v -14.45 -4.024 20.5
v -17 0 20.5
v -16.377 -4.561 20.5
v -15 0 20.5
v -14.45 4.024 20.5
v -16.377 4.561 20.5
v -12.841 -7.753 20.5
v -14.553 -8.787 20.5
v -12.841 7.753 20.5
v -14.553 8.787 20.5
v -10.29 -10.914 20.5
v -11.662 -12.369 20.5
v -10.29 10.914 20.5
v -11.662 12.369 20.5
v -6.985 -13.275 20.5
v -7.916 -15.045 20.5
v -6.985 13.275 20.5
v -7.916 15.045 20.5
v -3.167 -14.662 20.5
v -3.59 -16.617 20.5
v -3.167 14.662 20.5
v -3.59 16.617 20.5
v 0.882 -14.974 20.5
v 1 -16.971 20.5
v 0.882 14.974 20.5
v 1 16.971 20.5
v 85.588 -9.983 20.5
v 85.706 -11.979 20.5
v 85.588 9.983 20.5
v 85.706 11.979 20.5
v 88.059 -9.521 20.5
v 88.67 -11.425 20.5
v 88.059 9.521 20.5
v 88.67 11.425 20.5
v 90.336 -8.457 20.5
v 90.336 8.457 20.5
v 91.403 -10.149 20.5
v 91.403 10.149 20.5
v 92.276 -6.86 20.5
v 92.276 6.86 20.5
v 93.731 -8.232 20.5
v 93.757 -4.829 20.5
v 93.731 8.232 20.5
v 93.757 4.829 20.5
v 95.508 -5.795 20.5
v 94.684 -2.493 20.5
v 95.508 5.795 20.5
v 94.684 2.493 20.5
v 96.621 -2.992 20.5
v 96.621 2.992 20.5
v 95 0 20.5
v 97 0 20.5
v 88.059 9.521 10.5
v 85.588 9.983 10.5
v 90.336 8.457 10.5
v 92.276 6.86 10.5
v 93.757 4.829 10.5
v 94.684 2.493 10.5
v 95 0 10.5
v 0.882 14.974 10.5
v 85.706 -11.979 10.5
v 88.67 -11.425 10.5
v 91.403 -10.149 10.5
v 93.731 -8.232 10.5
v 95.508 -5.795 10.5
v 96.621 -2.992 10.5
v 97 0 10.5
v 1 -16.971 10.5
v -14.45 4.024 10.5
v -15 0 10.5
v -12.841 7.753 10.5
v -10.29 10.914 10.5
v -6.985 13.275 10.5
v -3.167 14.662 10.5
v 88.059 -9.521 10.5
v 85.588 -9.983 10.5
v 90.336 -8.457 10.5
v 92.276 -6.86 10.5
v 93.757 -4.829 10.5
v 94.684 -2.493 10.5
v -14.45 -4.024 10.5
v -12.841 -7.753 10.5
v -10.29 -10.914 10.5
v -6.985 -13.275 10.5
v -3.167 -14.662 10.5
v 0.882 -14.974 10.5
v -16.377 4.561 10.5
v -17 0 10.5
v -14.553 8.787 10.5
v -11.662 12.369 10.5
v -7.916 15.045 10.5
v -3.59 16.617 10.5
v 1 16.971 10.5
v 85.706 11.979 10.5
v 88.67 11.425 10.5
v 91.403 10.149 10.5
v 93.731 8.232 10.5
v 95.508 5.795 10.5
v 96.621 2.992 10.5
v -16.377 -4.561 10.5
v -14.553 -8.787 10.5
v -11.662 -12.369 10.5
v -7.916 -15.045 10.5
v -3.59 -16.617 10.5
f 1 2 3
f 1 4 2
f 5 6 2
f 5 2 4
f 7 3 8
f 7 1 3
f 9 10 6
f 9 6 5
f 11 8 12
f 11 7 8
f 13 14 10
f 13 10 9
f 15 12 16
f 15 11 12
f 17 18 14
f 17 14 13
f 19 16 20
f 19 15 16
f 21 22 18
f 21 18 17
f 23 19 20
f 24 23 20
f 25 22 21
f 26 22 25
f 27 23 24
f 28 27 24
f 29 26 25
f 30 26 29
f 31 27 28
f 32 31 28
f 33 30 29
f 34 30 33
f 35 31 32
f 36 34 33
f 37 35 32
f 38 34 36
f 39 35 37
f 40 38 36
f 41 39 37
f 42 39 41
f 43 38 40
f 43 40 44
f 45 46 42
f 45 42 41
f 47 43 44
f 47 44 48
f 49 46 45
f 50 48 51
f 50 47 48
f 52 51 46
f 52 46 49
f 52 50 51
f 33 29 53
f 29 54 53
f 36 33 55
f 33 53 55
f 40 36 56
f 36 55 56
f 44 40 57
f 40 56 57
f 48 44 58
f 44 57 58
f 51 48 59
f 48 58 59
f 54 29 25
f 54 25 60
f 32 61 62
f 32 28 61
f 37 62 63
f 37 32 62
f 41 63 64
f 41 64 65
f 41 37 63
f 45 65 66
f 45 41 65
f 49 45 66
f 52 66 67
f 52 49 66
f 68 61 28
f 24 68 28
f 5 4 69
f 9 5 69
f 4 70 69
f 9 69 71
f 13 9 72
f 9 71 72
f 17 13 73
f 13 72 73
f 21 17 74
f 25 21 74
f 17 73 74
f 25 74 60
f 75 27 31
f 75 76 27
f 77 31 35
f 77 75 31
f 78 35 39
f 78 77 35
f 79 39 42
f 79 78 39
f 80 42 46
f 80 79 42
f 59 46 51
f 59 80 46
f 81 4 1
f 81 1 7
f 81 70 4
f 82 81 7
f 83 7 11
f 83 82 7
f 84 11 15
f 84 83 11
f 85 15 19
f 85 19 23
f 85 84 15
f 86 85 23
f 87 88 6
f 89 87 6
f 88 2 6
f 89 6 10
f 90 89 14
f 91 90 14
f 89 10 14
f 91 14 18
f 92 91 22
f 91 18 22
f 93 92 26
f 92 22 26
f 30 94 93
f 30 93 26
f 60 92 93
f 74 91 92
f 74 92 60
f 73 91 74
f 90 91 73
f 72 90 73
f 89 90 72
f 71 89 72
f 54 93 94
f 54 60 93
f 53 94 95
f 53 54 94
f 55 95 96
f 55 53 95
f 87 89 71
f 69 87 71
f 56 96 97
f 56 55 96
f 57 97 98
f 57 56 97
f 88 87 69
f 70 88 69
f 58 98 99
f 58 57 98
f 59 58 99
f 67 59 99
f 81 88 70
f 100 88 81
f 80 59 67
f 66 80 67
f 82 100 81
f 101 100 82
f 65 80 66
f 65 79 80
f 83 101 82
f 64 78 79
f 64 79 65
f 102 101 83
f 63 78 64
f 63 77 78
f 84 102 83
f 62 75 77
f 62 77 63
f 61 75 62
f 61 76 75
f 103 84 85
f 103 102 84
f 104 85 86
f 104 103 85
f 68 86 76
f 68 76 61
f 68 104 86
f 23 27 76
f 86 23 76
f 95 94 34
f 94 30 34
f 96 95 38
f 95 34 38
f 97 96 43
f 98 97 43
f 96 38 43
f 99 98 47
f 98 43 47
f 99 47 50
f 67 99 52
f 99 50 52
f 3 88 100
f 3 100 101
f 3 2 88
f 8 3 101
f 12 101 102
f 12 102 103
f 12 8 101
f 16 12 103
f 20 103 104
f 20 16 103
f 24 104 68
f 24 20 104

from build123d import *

# Parameters (mm, degrees)
SKIZZE2_W = 2
SKIZZE2_H = 10


with BuildPart() as part:
    # Austragung1: sweep along a path in Skizze3
    with BuildLine(Plane.XY.offset(15.5)) as austragung1_path:
        ThreePointArc((-15, 0), (-10.289915109, 10.914103127), (0.882352941, 14.974025955))
        Line((0.882352941, 14.974025955), (85.588235294, 9.98268397))
        ThreePointArc((85.588235294, 9.98268397), (92.276068751, 6.859943406), (95, 0))
    # Skizze2 → Austragung1 (sweep)
    with BuildSketch(Plane(origin=(0, 0, 0), x_dir=(1, 0, 0), z_dir=(0, 1, 0))):
        with Locations((-16, -15.5)):
            Rectangle(SKIZZE2_W, SKIZZE2_H)
    sweep(path=austragung1_path.line)

    # Spiegeln1: part across plane


with BuildPart() as part_1:
    add(part.part)
    add(part.part.mirror(Plane(origin=(0, 0, 0), x_dir=(0, 0, 1), z_dir=(0, -1, 0))))


solid = part_1.part
